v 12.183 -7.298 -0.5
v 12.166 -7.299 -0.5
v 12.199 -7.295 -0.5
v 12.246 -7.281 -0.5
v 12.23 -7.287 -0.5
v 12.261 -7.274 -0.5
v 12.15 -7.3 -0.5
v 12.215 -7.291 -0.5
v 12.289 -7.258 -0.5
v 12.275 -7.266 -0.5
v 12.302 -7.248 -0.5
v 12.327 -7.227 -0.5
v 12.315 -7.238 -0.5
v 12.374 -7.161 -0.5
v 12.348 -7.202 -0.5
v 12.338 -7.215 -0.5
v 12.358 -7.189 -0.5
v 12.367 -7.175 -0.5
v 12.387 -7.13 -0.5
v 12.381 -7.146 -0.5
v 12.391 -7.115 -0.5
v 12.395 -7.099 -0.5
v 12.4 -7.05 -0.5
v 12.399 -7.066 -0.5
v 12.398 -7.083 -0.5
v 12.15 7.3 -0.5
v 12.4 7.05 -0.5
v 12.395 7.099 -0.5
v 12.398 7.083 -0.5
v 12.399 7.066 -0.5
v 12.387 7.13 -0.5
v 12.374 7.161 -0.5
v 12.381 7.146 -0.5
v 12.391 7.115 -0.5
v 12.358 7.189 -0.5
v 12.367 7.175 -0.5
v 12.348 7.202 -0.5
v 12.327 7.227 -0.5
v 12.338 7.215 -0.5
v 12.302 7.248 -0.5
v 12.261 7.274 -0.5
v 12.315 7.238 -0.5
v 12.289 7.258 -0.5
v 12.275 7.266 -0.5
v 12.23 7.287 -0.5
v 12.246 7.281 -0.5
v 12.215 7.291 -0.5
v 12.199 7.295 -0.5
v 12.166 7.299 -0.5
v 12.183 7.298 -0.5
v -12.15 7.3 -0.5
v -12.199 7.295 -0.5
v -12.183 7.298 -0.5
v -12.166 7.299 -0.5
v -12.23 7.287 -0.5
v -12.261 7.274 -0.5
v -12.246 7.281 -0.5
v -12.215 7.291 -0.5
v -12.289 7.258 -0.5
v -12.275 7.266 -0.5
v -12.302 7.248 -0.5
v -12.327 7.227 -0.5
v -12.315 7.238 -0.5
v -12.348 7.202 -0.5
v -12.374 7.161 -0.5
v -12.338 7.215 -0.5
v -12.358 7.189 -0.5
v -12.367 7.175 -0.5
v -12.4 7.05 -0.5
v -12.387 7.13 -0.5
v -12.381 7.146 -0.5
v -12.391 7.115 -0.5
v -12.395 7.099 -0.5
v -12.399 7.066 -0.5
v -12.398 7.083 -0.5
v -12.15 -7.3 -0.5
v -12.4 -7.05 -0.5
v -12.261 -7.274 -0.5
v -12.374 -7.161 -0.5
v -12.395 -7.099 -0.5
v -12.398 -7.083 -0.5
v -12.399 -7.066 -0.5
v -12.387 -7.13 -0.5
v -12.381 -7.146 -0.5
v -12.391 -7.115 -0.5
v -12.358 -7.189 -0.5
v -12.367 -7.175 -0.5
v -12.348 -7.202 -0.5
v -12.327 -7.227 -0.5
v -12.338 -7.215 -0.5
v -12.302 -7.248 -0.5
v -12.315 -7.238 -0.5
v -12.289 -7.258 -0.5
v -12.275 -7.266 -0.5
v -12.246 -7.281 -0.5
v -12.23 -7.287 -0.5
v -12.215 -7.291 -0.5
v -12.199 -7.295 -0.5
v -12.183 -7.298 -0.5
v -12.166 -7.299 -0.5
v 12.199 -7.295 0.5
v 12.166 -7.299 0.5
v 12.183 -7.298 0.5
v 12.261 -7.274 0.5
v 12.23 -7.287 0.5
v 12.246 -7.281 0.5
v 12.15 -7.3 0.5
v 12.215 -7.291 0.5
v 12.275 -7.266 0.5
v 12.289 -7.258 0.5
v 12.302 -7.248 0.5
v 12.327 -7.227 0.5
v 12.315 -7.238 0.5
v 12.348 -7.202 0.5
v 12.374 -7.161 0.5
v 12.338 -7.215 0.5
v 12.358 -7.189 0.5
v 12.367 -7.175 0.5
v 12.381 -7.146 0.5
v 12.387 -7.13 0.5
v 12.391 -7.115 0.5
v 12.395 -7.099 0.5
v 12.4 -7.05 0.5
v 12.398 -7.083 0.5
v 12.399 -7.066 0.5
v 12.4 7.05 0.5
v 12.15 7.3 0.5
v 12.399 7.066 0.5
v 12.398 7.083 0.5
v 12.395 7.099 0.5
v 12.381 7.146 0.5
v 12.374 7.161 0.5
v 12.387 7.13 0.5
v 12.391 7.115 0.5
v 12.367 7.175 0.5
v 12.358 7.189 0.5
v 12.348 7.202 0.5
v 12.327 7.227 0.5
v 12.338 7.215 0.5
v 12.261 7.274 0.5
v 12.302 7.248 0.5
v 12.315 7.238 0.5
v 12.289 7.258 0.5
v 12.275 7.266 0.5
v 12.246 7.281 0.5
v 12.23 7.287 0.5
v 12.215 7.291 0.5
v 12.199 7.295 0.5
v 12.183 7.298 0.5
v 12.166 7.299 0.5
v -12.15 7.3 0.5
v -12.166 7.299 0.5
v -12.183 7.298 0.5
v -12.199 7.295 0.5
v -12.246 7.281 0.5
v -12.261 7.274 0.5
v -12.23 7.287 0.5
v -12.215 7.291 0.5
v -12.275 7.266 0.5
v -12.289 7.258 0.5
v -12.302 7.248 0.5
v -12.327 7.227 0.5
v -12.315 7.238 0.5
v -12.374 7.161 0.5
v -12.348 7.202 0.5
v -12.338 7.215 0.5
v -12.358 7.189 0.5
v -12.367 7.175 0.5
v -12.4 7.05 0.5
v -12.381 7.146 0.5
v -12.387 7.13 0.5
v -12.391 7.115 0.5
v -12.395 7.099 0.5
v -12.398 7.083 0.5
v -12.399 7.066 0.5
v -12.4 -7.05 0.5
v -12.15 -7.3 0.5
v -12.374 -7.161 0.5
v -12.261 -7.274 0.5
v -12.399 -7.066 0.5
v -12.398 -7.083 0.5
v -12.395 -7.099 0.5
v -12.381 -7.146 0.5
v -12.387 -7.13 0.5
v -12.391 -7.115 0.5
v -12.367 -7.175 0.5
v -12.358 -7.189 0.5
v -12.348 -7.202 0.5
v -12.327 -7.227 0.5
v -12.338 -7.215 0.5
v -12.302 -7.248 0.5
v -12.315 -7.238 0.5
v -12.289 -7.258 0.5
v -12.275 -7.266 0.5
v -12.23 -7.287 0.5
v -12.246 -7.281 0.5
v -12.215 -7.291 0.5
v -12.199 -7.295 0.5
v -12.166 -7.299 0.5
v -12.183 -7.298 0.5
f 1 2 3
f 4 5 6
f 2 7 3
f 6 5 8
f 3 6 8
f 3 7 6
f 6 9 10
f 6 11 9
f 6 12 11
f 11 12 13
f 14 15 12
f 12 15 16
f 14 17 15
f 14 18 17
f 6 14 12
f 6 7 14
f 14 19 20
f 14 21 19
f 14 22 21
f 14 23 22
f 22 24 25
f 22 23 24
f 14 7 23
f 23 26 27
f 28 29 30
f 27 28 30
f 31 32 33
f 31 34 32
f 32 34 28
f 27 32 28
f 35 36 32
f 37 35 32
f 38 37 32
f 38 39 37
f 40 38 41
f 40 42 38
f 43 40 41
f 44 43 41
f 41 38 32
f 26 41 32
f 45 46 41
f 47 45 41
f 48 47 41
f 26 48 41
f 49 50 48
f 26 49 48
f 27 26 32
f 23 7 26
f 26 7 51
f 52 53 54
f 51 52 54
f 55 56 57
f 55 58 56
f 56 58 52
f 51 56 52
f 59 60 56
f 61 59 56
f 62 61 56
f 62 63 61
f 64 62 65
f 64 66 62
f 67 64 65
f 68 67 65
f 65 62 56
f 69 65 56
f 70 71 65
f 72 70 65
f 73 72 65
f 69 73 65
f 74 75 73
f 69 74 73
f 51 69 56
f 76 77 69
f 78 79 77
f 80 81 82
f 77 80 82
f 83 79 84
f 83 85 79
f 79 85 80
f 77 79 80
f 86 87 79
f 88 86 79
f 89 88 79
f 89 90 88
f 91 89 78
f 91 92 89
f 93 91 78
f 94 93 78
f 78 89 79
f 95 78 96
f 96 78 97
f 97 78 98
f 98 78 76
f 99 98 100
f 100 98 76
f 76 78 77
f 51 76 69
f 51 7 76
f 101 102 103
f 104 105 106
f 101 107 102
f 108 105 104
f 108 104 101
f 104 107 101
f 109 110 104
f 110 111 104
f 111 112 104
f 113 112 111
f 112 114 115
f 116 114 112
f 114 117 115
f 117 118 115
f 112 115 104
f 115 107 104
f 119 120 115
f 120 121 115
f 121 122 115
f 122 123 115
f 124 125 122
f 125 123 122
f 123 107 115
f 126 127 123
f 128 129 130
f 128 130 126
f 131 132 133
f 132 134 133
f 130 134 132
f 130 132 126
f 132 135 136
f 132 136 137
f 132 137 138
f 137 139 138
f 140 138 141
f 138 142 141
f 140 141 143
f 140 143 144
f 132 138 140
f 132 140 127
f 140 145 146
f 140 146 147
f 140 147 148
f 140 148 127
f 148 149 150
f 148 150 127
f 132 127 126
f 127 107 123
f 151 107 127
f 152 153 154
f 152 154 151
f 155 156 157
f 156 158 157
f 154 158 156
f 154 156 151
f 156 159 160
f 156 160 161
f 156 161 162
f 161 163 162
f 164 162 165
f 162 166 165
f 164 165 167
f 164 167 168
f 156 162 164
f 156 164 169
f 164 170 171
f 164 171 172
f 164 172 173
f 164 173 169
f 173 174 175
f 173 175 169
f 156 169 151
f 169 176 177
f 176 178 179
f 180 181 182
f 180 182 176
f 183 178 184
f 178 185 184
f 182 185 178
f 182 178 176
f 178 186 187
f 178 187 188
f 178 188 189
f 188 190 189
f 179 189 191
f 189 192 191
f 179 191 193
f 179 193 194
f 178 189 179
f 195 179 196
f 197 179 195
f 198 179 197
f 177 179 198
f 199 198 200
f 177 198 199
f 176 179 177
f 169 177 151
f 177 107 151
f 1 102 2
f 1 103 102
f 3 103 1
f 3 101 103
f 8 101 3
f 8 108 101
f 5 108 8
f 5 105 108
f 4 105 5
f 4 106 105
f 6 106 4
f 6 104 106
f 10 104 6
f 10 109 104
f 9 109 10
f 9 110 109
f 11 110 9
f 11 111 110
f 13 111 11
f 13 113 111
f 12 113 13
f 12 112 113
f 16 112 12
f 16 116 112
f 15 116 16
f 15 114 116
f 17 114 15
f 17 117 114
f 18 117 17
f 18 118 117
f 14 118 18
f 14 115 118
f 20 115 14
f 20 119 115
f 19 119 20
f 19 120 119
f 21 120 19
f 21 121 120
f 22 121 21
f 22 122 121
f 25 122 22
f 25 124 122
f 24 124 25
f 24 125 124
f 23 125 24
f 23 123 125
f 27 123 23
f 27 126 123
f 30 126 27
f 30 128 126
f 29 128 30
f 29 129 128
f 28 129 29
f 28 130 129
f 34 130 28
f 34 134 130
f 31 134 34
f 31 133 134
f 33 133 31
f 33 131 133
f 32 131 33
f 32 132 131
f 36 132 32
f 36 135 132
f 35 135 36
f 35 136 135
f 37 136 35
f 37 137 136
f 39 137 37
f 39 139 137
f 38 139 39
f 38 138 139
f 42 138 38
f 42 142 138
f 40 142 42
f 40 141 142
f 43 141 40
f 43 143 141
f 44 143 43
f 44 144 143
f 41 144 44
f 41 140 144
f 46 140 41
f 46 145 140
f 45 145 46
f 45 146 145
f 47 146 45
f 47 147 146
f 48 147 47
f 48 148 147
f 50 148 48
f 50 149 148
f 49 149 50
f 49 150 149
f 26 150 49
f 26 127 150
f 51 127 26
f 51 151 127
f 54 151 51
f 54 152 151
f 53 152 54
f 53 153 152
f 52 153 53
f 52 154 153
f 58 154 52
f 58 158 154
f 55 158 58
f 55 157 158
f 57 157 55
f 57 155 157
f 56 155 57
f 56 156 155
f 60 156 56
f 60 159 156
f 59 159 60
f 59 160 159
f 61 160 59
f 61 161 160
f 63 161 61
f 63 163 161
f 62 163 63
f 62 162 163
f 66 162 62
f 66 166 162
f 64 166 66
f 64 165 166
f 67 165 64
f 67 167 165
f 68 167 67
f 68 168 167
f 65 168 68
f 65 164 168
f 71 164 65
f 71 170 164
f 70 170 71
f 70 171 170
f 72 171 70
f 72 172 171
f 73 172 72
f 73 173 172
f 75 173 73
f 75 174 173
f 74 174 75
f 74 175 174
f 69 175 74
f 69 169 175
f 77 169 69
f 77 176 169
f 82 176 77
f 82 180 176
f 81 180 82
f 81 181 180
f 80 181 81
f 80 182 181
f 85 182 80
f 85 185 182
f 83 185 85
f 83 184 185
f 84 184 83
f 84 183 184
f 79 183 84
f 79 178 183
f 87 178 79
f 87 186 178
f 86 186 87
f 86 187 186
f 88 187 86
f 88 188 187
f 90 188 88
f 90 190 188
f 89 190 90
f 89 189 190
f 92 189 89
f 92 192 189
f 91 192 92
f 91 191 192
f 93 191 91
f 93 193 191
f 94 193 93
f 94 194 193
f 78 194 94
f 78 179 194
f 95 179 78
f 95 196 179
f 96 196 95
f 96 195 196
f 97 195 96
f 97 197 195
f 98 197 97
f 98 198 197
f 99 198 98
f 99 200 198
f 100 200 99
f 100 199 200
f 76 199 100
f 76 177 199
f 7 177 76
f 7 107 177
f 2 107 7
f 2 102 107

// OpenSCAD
// PCB: 24.8mm x 14.6mm x 1.0mm (single connected solid)

pcb_length    = 24.8;
pcb_width     = 14.6;
pcb_thickness = 1.0;

// Small rounding helps visibility in renders while keeping exact overall size.
corner_radius = 0.25; // mm (set to 0 for sharp corners)

$fn = 96;

module pcb_board(L, W, T, R) {
    // Guard against invalid radii that could create empty geometry
    r = max(0, min(R, min(L, W)/2 - 0.001));

    if (r <= 0) {
        cube([L, W, T], center=true);
    } else {
        // Rounded rectangle in XY, extruded to thickness T.
        // offset(r=r) applied to a reduced square keeps overall size exactly L x W.
        linear_extrude(height=T, center=true, convexity=10)
            offset(r=r)
                square([L - 2*r, W - 2*r], center=true);
    }
}

color([0.0, 0.4, 0.2])
    pcb_board(pcb_length, pcb_width, pcb_thickness, corner_radius);
